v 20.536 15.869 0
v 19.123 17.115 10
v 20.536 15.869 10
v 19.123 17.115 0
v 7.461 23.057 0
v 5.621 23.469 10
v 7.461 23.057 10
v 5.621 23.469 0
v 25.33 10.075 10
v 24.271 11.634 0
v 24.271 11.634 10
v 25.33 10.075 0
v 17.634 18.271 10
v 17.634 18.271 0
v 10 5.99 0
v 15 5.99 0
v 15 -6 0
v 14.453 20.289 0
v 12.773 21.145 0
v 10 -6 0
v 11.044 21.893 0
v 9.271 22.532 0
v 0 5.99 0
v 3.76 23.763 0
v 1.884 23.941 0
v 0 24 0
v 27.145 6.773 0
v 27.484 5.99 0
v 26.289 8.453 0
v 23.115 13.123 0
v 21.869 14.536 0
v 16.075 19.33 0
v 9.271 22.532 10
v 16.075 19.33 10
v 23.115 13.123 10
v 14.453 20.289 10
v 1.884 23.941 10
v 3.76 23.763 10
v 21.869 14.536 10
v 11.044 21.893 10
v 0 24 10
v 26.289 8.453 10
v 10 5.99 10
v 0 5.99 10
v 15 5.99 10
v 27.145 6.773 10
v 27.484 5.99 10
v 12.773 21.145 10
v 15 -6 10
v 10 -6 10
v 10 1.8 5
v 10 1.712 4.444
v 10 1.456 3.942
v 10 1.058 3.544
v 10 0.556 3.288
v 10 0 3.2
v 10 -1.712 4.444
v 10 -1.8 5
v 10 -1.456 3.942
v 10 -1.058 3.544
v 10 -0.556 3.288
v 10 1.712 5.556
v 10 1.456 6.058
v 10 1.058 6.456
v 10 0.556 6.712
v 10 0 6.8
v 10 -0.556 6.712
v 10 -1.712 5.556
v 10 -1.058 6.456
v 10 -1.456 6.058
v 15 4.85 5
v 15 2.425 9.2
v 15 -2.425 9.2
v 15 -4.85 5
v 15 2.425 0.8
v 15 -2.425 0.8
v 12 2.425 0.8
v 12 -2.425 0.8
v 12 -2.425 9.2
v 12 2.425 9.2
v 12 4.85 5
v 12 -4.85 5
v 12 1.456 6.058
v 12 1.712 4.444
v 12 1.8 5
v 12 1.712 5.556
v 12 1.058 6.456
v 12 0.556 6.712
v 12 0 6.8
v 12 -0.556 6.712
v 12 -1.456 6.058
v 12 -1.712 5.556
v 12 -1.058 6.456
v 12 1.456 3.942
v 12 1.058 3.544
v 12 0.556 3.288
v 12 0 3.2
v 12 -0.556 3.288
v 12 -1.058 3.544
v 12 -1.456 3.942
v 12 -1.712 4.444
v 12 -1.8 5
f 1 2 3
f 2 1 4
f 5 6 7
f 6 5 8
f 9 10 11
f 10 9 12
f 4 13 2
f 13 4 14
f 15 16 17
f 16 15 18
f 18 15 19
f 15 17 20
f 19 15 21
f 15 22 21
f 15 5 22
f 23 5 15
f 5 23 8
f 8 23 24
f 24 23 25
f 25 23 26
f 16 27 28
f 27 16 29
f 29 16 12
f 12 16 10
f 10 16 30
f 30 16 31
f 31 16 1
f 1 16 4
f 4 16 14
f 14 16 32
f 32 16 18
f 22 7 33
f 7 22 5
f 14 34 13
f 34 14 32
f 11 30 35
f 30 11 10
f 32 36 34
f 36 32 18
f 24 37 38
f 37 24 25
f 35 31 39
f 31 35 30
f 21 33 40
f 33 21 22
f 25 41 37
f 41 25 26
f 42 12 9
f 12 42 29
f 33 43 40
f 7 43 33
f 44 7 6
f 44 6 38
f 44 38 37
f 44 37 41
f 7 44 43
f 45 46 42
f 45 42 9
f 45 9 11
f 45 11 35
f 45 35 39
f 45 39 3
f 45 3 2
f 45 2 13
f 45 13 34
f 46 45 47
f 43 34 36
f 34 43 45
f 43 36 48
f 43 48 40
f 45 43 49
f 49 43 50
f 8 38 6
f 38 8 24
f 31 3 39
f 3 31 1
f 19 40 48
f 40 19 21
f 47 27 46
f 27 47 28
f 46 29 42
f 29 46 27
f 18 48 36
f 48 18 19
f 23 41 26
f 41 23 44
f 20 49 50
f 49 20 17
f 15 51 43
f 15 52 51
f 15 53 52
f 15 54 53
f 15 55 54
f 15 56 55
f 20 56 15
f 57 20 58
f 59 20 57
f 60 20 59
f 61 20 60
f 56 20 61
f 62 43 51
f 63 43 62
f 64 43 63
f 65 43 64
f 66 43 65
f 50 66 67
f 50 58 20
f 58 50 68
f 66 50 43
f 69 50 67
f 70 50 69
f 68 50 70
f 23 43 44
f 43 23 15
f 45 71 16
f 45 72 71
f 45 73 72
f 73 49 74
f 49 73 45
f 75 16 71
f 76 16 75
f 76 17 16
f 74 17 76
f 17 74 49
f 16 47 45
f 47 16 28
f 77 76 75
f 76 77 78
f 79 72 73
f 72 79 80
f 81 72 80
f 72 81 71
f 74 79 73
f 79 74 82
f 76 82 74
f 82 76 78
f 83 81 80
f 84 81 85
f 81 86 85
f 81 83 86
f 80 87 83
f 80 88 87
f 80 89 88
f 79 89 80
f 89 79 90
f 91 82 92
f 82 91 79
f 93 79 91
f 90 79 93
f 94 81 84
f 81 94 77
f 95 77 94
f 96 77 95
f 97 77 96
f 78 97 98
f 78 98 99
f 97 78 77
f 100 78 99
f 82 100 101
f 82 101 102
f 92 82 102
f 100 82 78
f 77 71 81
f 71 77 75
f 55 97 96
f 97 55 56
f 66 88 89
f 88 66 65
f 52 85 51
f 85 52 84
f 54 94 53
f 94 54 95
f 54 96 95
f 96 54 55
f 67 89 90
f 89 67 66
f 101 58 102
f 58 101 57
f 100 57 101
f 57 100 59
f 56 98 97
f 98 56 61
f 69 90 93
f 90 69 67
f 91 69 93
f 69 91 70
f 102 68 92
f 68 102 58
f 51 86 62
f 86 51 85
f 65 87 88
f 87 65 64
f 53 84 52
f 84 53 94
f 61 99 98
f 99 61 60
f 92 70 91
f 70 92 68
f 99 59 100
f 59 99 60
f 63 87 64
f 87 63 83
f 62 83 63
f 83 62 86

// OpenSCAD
// file: extruder_constants.scad
// extruder_constants.scad
// A variety of driving variables for angled EzStruder Holders for Rostock MAX V2.
// By Gregg Christopher, 2015
// This file is public domain.
// The Rostock Max V2 is by SeeMeCNC: seemecnc.com

// Tolerance Variables
manifold_slop = 0.01;
res = 10;



motor_cutout_x_pos = -169.329;
motor_cutout_y_pos = 467.08;

motor_x_size = 42.49;
motor_y_size = motor_x_size;

lifter_x_pos = 270.15;
lifter_y_pos = 401.6;


motor_holder_size = 54.3;

melamine_thickness = 6.4;
//baseplate_thickness = melamine_thickness;
baseplate_thickness = 12;

ezstruder_mount_height = 28;

lifter_radius = 8.5;
lifter_bottom_distance = 17.9;

motor_side_brace_width = 10;
motor_brace_length = motor_x_size/2 + motor_holder_size/2;
brace_bevel_scale = 2;


motor_mount_width = motor_holder_size + 2*motor_side_brace_width;

top_plate_x_pos = 36.81;
top_plate_y_pos = 296.4;

// Used to preview position of Rostock MAX V2 top plate
module top_place_centered() {
  translate([-top_plate_x_pos, -top_plate_y_pos]) scale([25.4, 25.4]) import("top_plate.dxf");
}

// Used to preview center hole of Rostock MAX V2 top plate
module top_hole_centered() {
  translate([-top_plate_x_pos, -top_plate_y_pos]) scale([25.4, 25.4]) import("top_hole.dxf");
}

top_center_hole_radius = 12.45;


screw_line_origin = 14.87;

screw_line_angle = 53.5;

//screw_hole_r = 1.7;
screw_hole_r = 1.8;
screw1_dist = 18.66;
screw2_dist = 63;

screw_attachment_thickness = 10;
nut_gap_thickness = 5;
nut_gap_width = 10;


center_hole_plate_radius = top_center_hole_radius + 5;
top_plate_thickness = 4;


screw_bracket_1_pos = 35;
//screw_bracket_2_pos = 100;
screw_bracket_2_pos = 88;

nut_clearance_r = 6;
bracket_wall_thickness = 4;
bracket_length = 8;
bracket_depth_offset = 2.55;
extra_screw_depth = 5;
// main file
// nut_clamps.scad
// Captive nut holders and lateral braces for Angled EzStruder Holders for Rostock MAX V2.
// By Gregg Christopher, 2015
// This file is public domain.
// The Rostock Max V2 is by SeeMeCNC: seemecnc.com

include <extruder_constants.scad>

module nut_clamp() {
  // Space for an 6-32 captive nut
  nut_radius = 4.0 / cos(30) * 1.05; // Added 5% allowance for shrinkage and bridging goop. 
  nut_height = 3.0;
  translate([-nut_gap_width/2, -baseplate_thickness/2, 0]) 
  difference() {
    intersection() {
      rotate([0, 90, 0]) scale([1, 1, 1]) cylinder(r = 2*(screw_attachment_thickness + nut_gap_thickness), h = nut_gap_width, $fn = 10*res);
      translate([0, 0, 0]) cube([nut_gap_width, 2*(screw_attachment_thickness + nut_gap_thickness), 2*(screw_attachment_thickness + nut_gap_thickness)]);
    }
    // Trim shape for insertion to main extruder holder body. 
    translate([-manifold_slop, -manifold_slop, -manifold_slop]) cube([nut_gap_width + 2*manifold_slop, baseplate_thickness, screw_attachment_thickness + manifold_slop]);
    translate([-manifold_slop, -manifold_slop, screw_attachment_thickness + nut_gap_thickness]) cube([nut_gap_width + 2*manifold_slop, baseplate_thickness, screw_attachment_thickness + nut_gap_thickness + manifold_slop]);
    // Cutout for captive nut
    translate([nut_gap_width/2, baseplate_thickness/2, screw_attachment_thickness + nut_gap_thickness - nut_height]) rotate([0, 0, 90]) cylinder(r = nut_radius, h = nut_height + manifold_slop, $fn = 6);
    // Screw hole
    translate([nut_gap_width/2, baseplate_thickness/2, screw_attachment_thickness - manifold_slop]) cylinder(r = screw_hole_r, h = screw_attachment_thickness + 2*manifold_slop, $fn = 20);
  }
}

translate([0, 0, nut_gap_width/2])
rotate([0, 90, 0]) nut_clamp(); 
